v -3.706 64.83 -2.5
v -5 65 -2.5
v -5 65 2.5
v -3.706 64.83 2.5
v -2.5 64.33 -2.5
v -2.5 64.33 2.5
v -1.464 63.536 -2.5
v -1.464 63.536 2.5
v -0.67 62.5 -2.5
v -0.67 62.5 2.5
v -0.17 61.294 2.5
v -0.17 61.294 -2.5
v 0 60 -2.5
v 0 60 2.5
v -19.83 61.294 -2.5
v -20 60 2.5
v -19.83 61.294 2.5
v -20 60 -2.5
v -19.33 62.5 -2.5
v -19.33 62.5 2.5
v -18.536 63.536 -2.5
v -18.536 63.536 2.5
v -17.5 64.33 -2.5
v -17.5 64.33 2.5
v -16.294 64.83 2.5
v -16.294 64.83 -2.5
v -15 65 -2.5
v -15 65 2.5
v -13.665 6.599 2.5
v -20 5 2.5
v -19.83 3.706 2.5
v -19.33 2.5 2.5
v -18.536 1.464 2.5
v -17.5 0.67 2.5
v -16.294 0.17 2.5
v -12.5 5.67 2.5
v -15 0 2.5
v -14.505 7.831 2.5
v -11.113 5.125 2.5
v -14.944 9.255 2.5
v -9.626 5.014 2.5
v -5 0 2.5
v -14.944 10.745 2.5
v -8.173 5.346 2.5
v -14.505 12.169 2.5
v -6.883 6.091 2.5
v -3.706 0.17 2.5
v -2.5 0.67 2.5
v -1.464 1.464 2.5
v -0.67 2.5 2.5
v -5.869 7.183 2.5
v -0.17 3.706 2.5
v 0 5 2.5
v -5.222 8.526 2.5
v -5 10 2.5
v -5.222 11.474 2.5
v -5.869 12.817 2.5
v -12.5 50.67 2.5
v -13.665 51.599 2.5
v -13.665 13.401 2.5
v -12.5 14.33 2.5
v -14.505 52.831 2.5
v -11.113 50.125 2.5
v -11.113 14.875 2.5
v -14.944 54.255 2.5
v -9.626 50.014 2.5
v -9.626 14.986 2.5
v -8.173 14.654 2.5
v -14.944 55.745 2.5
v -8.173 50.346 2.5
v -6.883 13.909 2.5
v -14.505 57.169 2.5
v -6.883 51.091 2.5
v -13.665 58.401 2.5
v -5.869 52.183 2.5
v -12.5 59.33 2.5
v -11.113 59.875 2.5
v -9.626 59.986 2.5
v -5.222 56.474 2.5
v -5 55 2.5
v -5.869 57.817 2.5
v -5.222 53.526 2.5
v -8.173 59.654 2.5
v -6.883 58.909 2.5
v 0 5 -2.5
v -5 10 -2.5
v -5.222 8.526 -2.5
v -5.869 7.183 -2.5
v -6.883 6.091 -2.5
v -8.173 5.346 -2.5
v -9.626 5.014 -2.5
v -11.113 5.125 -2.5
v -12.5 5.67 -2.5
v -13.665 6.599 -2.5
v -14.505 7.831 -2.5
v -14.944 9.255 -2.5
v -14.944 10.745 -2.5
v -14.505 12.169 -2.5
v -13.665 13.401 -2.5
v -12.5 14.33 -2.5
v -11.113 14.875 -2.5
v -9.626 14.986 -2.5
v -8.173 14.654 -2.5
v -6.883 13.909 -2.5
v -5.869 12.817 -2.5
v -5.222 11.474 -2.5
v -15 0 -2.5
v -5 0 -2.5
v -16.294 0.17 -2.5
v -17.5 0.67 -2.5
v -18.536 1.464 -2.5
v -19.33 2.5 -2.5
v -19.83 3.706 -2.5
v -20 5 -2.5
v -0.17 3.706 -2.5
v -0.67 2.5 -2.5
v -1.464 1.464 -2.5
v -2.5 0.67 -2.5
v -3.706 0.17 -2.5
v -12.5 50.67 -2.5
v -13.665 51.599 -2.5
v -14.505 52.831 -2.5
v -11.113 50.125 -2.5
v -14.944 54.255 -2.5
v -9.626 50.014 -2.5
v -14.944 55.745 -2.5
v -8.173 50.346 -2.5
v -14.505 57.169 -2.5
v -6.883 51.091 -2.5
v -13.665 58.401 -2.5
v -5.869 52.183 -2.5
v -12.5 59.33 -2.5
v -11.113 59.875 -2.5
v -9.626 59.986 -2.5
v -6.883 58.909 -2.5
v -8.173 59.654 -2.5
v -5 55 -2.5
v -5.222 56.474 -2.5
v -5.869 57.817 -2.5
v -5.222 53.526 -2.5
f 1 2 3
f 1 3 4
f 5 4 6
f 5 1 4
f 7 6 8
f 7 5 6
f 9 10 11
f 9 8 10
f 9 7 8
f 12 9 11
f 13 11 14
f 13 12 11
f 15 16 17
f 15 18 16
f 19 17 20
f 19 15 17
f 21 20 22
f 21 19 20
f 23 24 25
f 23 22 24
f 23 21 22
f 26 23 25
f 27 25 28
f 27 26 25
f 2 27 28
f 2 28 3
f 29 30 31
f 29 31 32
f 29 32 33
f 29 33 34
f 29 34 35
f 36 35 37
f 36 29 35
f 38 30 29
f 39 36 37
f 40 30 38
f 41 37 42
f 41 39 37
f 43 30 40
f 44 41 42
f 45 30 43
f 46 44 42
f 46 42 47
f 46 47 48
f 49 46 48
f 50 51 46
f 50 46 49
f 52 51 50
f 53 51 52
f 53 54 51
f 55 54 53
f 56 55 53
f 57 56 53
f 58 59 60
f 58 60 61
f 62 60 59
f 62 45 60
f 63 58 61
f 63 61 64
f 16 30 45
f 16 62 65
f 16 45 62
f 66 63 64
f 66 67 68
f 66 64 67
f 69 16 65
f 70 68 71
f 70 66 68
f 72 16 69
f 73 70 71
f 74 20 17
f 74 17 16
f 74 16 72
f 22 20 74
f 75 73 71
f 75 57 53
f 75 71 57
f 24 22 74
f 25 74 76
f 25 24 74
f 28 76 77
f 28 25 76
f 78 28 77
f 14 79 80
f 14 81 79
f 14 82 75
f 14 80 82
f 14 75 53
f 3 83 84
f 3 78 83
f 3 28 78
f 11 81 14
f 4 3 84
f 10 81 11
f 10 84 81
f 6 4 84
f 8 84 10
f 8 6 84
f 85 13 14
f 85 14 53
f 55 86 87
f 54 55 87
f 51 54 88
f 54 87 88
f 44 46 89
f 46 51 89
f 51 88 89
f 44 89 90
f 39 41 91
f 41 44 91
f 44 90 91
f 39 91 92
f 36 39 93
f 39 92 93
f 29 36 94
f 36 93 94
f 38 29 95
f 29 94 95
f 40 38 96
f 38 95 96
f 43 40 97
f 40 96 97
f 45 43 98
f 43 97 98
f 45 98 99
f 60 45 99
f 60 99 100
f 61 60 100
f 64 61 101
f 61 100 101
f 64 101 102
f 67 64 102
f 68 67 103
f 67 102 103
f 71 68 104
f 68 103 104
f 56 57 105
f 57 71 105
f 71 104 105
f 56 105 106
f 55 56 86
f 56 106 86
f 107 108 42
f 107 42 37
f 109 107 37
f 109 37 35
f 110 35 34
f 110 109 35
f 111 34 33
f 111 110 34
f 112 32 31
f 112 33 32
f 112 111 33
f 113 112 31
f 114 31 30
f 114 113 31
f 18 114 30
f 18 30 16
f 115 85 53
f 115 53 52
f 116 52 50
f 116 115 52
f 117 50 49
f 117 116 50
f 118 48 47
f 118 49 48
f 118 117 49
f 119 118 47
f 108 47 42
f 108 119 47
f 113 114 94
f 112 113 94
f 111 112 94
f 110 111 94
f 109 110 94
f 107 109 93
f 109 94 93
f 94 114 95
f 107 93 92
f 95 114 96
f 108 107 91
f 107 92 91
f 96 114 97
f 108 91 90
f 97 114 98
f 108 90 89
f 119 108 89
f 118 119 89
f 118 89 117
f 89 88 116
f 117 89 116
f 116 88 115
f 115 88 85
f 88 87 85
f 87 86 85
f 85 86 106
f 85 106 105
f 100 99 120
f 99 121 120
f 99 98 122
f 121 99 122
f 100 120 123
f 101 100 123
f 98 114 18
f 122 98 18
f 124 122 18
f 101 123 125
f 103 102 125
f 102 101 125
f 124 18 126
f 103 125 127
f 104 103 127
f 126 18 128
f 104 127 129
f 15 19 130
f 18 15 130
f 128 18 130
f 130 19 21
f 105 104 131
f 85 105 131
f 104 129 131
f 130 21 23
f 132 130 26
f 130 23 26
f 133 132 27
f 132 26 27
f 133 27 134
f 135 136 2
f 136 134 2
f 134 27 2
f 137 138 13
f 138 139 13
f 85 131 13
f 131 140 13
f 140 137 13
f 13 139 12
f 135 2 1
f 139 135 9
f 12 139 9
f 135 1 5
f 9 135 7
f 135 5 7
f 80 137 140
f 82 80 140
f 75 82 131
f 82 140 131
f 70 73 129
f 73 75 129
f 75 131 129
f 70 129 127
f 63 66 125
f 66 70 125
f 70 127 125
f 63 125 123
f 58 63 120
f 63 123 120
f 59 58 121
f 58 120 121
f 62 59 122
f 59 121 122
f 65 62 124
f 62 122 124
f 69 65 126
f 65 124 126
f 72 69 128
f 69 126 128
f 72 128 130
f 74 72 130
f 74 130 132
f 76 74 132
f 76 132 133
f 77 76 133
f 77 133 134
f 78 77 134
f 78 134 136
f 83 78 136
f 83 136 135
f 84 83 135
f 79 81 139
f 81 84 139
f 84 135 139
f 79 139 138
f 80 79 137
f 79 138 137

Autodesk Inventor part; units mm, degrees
ref_plane "YZ Plane" through (0, 0, 0) normal (1, 0, 0) x (0, 1, 0)
ref_plane "XZ Plane" through (0, 0, 0) normal (0, 1, 0) x (-1, 0, 0)
ref_plane "XY Plane" through (0, 0, 0) normal (0, 0, 1) x (1, 0, 0)
sketch "Sketch1" plane through (0, 0, 0) normal (0, 0, 1) x (1, 0, 0)
  line L0 (-5, 0) -> (-15, 0)
  line L1 (-20, 5) -> (-20, 60)
  line L2 (-15, 65) -> (-5, 65)
  line L3 (0, 60) -> (0, 5)
  circle A0 centre (-10, 55) radius 5
  circle A1 centre (-10, 10) radius 5
  arc A2 (-15, 65) -> (-20, 60) centre (-15, 60) ccw
  arc A3 (0, 60) -> (-5, 65) centre (-5, 60) ccw
  arc A4 (-20, 5) -> (-15, 0) centre (-15, 5) ccw
  arc A5 (-5, 0) -> (0, 5) centre (-5, 5) ccw
  point P0 (0, 0)
  point P1 (-20, 65)
  point P2 (-20, 0)
  point P3 (0, 65)
  dimension "d0" = 20
  dimension "d1" = 65
  dimension "d2" = 10
  dimension "d3" = 45
  dimension "d4" = 10
  dimension "d5" = 5
extrude "Extrusion1" add sketch "Sketch1" along normal mid plane 5
sketch "Sketch2" plane through (0, 0, 2.5) normal (0, 0, 1) x (1, 0, 0)
  line L0 (-5, 65) -> (-15, 65) projected
  arc A0 (-15, 65) -> (-20, 60) centre (-15, 60) ccw projected
  line L1 (-20, 60) -> (-20, 5) projected
  arc A1 (-20, 5) -> (-15, 0) centre (-15, 5) ccw projected
  line L2 (-15, 0) -> (-5, 0) projected
  arc A2 (-5, 0) -> (0, 5) centre (-5, 5) ccw projected
  line L3 (0, 5) -> (0, 60) projected
  arc A3 (0, 60) -> (-5, 65) centre (-5, 60) ccw projected
  circle A4 centre (-10, 10) radius 5 projected
  circle A5 centre (-10, 55) radius 5 projected
  point P0 (0, 0)
properties part number "Servo arm" material "Aluminum 6061"
